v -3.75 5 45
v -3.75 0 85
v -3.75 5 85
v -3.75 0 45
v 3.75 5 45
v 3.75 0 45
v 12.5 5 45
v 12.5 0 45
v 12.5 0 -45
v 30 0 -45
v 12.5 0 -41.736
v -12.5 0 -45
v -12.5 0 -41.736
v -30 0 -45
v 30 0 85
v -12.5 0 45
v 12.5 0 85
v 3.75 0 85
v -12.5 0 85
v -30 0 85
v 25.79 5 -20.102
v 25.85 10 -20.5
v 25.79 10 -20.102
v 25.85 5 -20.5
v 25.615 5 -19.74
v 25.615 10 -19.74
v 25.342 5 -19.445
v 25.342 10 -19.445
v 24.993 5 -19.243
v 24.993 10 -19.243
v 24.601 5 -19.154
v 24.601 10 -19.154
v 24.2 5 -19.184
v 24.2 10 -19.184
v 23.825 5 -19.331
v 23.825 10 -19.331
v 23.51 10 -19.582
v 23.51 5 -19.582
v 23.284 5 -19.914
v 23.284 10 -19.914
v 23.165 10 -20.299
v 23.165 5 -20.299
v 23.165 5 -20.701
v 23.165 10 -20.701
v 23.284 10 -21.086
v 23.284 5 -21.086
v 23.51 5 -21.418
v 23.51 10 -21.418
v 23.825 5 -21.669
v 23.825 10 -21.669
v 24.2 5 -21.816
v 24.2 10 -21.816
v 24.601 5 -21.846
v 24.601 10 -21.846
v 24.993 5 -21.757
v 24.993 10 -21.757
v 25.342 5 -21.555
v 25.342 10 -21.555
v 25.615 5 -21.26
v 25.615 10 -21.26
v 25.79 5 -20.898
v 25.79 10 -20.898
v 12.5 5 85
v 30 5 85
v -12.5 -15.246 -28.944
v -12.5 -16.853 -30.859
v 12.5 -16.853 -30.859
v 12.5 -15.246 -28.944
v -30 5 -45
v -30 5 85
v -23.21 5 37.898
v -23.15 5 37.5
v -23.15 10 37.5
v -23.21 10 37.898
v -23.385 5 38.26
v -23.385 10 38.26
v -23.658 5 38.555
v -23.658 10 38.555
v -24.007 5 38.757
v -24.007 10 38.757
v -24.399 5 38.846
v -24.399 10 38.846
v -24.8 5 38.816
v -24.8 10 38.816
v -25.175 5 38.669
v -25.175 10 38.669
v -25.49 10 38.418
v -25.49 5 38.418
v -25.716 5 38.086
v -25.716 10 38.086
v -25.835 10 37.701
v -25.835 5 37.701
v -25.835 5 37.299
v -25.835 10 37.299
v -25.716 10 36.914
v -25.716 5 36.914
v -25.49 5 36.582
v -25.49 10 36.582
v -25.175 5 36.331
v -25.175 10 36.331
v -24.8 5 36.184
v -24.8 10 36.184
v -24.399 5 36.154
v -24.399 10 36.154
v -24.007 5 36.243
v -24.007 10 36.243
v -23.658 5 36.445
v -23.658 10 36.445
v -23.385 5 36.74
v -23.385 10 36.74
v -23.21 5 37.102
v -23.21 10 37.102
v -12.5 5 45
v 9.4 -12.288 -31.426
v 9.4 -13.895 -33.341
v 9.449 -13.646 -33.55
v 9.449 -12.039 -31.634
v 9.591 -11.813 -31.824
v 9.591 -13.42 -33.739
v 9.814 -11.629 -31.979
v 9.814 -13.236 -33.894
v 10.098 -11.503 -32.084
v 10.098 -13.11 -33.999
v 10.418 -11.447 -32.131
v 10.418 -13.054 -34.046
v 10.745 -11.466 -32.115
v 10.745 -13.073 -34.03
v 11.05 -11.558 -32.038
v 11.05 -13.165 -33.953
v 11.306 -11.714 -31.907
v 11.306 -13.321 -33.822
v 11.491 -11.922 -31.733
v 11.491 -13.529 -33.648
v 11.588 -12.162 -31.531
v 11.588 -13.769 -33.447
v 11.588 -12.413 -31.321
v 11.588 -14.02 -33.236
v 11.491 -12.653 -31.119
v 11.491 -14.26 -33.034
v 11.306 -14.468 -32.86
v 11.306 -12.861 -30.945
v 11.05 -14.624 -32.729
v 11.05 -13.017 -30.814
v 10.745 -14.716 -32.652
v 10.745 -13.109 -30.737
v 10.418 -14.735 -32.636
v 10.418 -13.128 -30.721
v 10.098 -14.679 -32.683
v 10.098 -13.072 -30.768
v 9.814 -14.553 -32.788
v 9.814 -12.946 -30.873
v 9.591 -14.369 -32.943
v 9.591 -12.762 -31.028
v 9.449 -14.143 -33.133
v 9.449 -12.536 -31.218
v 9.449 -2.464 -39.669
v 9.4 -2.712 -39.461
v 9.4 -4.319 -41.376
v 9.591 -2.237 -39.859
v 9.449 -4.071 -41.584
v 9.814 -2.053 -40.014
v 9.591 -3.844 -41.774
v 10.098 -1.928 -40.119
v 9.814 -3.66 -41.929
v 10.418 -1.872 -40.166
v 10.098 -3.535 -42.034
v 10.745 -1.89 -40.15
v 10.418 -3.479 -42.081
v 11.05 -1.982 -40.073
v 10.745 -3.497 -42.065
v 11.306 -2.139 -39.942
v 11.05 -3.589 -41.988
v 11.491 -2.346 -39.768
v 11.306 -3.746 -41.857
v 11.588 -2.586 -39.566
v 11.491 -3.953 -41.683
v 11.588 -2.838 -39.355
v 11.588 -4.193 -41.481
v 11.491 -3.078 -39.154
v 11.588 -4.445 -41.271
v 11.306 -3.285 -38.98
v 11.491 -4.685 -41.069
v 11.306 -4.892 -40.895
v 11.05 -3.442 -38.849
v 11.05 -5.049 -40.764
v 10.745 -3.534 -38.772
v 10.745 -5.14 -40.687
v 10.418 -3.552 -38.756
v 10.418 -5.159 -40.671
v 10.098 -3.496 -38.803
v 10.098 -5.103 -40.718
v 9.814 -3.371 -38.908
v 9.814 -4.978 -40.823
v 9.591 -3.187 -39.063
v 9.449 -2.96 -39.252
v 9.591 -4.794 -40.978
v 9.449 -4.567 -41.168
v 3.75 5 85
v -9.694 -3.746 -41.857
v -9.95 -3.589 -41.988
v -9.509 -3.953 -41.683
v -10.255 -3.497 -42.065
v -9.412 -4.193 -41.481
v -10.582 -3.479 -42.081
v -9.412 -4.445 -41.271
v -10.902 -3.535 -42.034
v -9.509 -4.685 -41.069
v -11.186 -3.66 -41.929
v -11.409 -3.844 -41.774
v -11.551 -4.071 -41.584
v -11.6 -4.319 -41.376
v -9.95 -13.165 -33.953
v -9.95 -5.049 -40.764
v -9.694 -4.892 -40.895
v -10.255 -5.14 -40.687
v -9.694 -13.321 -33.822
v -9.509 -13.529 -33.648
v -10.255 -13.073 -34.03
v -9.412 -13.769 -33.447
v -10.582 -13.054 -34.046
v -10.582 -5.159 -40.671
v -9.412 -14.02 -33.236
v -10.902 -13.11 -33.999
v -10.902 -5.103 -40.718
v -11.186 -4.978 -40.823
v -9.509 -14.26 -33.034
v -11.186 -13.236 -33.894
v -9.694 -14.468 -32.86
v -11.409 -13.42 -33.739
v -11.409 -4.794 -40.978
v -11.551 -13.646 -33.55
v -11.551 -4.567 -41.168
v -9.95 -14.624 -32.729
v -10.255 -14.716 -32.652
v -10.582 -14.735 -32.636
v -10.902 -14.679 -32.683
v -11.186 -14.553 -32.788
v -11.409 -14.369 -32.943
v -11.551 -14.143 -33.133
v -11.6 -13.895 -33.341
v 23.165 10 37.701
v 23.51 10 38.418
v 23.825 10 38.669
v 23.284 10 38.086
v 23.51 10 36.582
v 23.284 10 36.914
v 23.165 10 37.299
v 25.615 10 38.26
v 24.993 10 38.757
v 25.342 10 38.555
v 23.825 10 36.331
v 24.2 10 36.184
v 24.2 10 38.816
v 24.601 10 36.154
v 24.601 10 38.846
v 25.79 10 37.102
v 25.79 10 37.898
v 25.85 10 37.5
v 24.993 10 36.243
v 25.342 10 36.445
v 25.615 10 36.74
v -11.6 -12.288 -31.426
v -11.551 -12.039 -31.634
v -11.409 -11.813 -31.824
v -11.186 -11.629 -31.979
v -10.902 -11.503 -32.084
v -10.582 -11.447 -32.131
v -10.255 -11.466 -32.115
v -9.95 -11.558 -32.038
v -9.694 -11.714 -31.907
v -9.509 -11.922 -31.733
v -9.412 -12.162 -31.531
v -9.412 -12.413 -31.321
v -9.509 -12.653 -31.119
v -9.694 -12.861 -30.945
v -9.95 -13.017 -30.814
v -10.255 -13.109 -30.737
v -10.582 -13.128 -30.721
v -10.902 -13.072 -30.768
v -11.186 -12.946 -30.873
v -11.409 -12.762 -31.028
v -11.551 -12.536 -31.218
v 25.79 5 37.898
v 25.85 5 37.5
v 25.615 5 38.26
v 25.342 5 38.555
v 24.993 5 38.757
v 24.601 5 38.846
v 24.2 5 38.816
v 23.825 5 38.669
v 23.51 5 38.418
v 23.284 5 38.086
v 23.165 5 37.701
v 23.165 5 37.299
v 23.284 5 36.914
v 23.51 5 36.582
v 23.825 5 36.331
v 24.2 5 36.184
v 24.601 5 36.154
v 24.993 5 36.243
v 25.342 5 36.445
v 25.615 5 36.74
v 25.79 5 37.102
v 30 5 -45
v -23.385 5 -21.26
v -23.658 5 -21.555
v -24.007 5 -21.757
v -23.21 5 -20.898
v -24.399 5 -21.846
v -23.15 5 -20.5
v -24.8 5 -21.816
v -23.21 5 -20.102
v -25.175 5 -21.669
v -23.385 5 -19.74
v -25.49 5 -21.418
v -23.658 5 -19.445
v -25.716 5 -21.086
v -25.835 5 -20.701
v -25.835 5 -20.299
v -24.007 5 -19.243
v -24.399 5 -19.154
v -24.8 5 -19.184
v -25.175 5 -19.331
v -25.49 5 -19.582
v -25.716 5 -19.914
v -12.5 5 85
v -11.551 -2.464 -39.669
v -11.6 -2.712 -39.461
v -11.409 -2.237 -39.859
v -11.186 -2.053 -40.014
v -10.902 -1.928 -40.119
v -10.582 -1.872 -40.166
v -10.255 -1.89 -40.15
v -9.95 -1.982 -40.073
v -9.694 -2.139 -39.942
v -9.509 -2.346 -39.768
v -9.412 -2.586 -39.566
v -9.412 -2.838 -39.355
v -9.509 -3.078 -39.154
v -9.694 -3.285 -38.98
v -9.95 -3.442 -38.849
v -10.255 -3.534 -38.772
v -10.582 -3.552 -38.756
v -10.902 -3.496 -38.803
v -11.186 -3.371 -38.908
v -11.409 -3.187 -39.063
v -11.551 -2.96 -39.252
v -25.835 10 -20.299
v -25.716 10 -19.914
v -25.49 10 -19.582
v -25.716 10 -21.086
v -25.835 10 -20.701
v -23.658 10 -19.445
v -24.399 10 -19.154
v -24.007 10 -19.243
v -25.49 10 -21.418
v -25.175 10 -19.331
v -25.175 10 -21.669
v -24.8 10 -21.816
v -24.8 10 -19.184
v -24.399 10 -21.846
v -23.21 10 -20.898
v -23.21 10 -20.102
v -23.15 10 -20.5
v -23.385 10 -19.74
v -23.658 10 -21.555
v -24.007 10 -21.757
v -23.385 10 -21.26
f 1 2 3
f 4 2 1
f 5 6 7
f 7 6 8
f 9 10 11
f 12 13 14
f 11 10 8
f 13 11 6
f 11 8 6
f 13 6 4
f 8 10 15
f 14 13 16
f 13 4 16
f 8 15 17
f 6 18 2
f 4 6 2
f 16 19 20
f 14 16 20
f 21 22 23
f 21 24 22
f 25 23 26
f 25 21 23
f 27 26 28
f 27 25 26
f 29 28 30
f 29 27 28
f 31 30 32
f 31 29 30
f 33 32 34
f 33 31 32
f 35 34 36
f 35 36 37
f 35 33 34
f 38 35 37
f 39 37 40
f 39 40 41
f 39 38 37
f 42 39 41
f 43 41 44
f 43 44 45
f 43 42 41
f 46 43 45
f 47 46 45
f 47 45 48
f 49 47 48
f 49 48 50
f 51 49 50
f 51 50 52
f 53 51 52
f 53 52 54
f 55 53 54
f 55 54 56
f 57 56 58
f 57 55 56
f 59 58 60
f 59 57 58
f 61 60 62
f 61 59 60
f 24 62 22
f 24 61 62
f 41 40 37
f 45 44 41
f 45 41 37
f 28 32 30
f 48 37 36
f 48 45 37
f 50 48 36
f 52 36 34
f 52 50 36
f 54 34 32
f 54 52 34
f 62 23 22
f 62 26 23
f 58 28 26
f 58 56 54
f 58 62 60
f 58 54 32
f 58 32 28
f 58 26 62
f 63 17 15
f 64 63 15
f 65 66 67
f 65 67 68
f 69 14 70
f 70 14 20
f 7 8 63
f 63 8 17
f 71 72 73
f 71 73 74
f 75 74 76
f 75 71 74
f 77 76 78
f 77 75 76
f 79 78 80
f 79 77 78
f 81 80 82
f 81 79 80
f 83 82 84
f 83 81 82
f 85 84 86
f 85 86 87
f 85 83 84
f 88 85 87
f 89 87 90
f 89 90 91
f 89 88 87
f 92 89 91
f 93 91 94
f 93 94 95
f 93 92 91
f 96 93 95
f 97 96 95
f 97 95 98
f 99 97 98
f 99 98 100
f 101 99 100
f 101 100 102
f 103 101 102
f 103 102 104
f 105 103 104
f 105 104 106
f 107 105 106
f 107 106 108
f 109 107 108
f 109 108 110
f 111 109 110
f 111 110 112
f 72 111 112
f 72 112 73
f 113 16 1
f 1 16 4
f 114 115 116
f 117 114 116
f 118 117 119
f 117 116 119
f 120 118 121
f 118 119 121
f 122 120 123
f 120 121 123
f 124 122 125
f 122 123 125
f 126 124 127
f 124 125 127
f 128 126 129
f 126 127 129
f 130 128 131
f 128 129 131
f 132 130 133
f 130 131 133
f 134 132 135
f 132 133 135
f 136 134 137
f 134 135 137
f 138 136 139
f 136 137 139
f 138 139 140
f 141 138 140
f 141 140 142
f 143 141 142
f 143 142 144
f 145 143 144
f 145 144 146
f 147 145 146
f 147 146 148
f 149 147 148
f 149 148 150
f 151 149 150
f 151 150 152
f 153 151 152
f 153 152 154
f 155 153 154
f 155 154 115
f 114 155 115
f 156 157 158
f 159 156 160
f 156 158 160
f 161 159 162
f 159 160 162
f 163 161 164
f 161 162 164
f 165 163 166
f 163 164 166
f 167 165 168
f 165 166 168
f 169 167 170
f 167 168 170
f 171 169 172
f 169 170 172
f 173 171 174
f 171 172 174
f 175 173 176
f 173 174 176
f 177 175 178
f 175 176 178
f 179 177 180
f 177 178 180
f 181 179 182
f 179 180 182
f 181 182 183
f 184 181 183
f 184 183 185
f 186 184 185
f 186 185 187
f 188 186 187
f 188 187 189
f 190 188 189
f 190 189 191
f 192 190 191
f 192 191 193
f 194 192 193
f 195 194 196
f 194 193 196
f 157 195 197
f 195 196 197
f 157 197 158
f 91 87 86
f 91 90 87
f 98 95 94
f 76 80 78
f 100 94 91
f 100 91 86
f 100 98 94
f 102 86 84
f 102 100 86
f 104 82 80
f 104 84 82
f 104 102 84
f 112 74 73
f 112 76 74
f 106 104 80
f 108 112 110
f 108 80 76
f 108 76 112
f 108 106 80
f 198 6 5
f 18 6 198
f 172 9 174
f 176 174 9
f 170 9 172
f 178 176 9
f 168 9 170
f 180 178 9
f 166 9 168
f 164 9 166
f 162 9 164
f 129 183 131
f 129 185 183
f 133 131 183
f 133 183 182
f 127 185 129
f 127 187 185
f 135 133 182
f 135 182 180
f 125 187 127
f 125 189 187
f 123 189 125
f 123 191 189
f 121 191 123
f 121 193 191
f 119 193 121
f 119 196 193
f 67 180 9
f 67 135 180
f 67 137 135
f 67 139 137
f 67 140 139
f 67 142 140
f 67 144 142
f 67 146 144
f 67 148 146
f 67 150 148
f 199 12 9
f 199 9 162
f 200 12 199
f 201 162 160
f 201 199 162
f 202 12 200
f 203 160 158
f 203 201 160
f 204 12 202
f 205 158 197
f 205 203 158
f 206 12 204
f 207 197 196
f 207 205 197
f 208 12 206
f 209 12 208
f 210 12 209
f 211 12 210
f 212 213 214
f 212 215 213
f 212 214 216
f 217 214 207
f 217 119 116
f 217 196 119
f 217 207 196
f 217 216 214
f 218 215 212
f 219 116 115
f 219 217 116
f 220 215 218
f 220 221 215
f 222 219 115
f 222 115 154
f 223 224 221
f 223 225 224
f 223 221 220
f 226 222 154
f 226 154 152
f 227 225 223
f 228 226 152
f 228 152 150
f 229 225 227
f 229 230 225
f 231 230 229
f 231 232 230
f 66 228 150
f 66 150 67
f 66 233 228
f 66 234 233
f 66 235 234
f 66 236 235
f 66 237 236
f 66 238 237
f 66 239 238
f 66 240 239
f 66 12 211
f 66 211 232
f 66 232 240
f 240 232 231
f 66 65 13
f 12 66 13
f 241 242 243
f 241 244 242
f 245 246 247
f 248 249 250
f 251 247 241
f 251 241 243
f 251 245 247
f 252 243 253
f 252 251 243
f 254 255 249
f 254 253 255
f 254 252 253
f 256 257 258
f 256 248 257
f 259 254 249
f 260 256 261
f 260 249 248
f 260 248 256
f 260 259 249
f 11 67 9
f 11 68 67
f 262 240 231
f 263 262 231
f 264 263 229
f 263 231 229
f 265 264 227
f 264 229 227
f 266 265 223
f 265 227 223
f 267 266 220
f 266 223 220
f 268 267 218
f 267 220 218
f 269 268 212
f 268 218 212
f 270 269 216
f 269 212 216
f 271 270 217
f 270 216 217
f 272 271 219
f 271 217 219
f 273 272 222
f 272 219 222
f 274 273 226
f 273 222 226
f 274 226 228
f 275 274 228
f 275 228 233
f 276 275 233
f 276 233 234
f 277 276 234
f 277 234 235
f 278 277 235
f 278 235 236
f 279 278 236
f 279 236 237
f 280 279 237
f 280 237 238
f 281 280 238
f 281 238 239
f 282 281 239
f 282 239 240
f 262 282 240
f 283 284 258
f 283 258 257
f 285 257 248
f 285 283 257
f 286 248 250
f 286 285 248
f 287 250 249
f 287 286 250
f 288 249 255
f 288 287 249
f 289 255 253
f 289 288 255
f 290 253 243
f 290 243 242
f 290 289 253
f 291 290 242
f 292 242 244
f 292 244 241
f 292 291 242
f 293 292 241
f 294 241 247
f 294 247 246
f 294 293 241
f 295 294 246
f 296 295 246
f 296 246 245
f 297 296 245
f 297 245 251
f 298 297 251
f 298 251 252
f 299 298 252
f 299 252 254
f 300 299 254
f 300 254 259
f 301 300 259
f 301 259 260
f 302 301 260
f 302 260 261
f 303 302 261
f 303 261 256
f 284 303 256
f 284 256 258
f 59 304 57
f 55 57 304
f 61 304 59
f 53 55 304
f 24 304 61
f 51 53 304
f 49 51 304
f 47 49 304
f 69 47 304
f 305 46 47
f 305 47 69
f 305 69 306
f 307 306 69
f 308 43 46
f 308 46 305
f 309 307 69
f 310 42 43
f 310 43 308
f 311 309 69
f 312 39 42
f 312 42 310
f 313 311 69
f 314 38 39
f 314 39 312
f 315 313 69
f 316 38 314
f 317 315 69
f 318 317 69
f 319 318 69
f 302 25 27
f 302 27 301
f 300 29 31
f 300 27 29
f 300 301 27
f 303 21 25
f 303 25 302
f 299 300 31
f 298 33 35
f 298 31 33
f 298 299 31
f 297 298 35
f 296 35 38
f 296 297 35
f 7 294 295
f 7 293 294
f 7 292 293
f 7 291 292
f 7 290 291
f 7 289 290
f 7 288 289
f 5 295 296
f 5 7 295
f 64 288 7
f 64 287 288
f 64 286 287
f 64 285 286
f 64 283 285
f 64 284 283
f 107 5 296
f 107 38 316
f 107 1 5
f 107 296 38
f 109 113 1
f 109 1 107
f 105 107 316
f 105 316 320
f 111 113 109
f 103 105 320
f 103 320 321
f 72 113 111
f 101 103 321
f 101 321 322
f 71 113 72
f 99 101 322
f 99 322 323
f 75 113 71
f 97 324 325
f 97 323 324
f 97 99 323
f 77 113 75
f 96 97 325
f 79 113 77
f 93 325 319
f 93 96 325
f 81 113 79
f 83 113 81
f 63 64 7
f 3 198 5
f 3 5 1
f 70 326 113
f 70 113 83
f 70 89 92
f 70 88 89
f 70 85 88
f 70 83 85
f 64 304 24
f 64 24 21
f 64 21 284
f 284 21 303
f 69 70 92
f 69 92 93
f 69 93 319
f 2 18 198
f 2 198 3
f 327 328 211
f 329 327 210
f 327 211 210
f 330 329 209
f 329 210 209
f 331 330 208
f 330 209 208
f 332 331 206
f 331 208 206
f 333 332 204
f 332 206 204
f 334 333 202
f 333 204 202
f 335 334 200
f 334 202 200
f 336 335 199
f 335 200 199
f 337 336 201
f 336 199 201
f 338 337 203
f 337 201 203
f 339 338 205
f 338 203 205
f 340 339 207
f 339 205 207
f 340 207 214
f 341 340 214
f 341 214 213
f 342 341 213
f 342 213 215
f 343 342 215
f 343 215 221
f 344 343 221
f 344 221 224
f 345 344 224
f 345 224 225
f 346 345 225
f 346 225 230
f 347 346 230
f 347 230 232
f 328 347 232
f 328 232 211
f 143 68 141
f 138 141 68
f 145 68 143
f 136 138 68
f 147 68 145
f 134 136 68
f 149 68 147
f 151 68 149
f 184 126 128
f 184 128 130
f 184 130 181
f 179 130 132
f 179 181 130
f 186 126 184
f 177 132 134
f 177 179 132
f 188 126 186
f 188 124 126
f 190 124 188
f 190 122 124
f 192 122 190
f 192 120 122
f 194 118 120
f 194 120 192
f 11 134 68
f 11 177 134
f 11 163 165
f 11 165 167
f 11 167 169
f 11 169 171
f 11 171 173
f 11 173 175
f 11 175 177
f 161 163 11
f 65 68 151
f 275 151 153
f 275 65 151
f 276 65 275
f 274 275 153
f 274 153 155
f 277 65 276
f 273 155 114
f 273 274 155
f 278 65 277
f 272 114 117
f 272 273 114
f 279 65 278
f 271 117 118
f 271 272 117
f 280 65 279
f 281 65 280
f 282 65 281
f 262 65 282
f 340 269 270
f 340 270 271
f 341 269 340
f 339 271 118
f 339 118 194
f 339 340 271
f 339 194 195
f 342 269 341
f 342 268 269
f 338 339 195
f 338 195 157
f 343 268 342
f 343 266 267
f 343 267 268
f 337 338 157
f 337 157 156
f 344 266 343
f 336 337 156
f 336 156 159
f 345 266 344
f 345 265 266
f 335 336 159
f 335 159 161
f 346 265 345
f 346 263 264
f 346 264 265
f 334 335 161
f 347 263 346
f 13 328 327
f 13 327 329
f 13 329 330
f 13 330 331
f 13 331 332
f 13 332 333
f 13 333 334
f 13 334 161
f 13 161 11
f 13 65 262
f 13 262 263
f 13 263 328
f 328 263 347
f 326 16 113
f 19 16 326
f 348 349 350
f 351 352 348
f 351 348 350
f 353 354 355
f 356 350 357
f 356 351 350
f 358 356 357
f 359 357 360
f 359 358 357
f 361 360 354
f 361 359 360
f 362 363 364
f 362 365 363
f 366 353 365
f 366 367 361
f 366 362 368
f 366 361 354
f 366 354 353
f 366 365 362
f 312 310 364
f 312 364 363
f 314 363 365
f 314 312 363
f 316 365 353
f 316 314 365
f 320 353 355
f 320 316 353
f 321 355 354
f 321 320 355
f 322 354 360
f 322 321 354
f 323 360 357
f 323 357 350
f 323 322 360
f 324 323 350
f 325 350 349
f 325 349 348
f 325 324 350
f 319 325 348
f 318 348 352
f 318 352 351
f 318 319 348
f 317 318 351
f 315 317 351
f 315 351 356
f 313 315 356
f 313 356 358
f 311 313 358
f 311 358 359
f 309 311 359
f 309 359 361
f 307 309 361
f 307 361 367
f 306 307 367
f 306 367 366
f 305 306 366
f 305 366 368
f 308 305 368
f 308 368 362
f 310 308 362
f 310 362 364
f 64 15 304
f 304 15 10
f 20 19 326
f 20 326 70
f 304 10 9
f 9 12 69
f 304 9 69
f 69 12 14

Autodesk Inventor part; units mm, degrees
ref_plane "YZ Plane" through (0, 0, 0) normal (1, 0, 0) x (0, 1, 0)
ref_plane "XZ Plane" through (0, 0, 0) normal (0, 1, 0) x (-1, 0, 0)
ref_plane "XY Plane" through (0, 0, 0) normal (0, 0, 1) x (1, 0, 0)
sketch "Sketch1" plane through (0, 0, 0) normal (0, 1, 0) x (-1, 0, 0)
  line L0 (30, 45) -> (-30, 45)
  line L1 (-30, 45) -> (-30, -45)
  line L2 (-30, -45) -> (30, -45)
  line L3 (30, -45) -> (30, 45)
  line L4 (30, 45) -> (12.5, 45)
  line L5 (12.5, 45) -> (12.5, 85)
  line L6 (12.5, 85) -> (30, 85)
  line L7 (30, 85) -> (30, 45)
  line L8 (-30, 45) -> (-12.5, 45)
  line L9 (-12.5, 45) -> (-12.5, 85)
  line L10 (-12.5, 85) -> (-30, 85)
  line L11 (-30, 85) -> (-30, 45)
  line L12 (3.75, 45) -> (-3.75, 45)
  line L13 (-3.75, 45) -> (-3.75, 85)
  line L14 (-3.75, 85) -> (3.75, 85)
  line L15 (3.75, 85) -> (3.75, 45)
  point P0 (0, 0)
  point P1 (0, 45)
  dimension "d0" = 90
  dimension "d1" = 60
  dimension "d2" = 45
  dimension "d3" = 30
  dimension "d23" = 40
  dimension "d24" = 25
  dimension "d25" = 17.5
  dimension "d39" = 7.5
  dimension "d40" = 40
  dimension "d41" = 3.75
extrude "Extrusion1" add sketch "Sketch1" along normal blind 5
sketch "Sketch2" plane through (0, 5, 0) normal (0, 1, 0) x (1, 0, 0)
  line L0 (-24.5, -37.5) -> (24.5, -37.5)
  line L1 (24.5, -37.5) -> (24.5, 20.5)
  line L2 (24.5, 20.5) -> (-24.5, 20.5)
  line L3 (-24.5, 20.5) -> (-24.5, -37.5)
  line L4 (-12.5, -45) -> (12.5, -45) projected
  circle A0 centre (-24.5, -37.5) radius 1.35
  line L5 (-24.5, -8.5) -> (24.5, -8.5)
  line L6 (0, -37.5) -> (0, 20.5)
  circle A1 centre (24.5, -37.5) radius 1.35
  circle A2 centre (-24.5, 20.5) radius 1.35
  circle A3 centre (24.5, 20.5) radius 1.35
  point P0 (0, 0)
  point P1 (-30, -45)
  point P2 (30, -45)
  dimension "d6" = 49
  dimension "d7" = 58
  dimension "d8" = 24.5
  dimension "d9" = 7.5
  dimension "d10" = 2.7
  dimension "d13" = 49
  dimension "d16" = 58
extrude "Extrusion2" add sketch "Sketch2" along normal blind 5 contours L3 A0 L0 | L0 A0 L3 | A1 L1 L0 | L0 L1 A1 | A2 L2 L3 | L3 L2 A2 | A3 L2 L1 | L1 L2 A3
sketch "Sketch4" plane through (0, 0, 0) normal (1, 0, 0) x (0, 1, 0)
  line L0 (0, -45) -> (5, -45) projected
  line L1 (0, -45) -> (-16.853, -30.8587)
  line L2 (-16.853, -30.8587) -> (-15.246, -28.9436)
  line L3 (-15.246, -28.9436) -> (0, -41.7365)
  line L4 (0, -45) -> (0, 85) projected
  point P0 (0, 0)
  dimension "d28" = 130
  dimension "d29" = 2.5
  dimension "d30" = 22
extrude "Extrusion4" add sketch "Sketch4" along normal mid plane 25
sketch "Sketch6" plane through (12.5, 0, -45) normal (0, -0.6428, -0.766) x (-1, 0, 0)
  line L0 (-17.5, 0) -> (0, 0) projected
  line L1 (25, -22) -> (0, -22) projected
  line L2 (0, 0) -> (25, 0)
  line L3 (25, 0) -> (25, -22)
  line L4 (25, -22) -> (0, -22)
  line L5 (0, -22) -> (0, 0)
  line L6 (25, -2.0977) -> (0, -2.0977) projected
  circle A0 centre (2, -5.638) radius 1.1
  circle A1 centre (23, -5.638) radius 1.1
  circle A2 centre (2, -18.138) radius 1.1
  circle A3 centre (23, -18.138) radius 1.1
  line L7 (8.25, -13.788) -> (16.75, -13.788)
  line L8 (16.75, -13.788) -> (16.75, -22.288)
  line L9 (16.75, -22.288) -> (8.25, -22.288)
  line L10 (8.25, -22.288) -> (8.25, -13.788)
  line L11 (0, -22) -> (0, 0) projected
  line L12 (25, -22) -> (25, -2.0977) projected
  line L13 (0, -3.638) -> (25, -3.638)
  line L14 (25, -3.638) -> (25, -27.5)
  line L15 (25, -27.5) -> (0, -27.5)
  line L16 (0, -27.5) -> (0, -3.638)
  line L17 (12.5, -13.788) -> (12.5, -22.288)
  line L18 (8.25, -18.038) -> (16.75, -18.038)
  dimension "d42" = 2.2
  dimension "d43" = 2.2
  dimension "d44" = 2.2
  dimension "d45" = 2.2
  dimension "d47" = 2
  dimension "d48" = 0
  dimension "d50" = 0
  dimension "d52" = 0
  dimension "d53" = 2
  dimension "d56" = 0
  dimension "d59" = 12.5
  dimension "d60" = 8.5
  dimension "d61" = 8.5
  dimension "d63" = 23.862
  dimension "d65" = 2
  dimension "d66" = 12.5
  dimension "d69" = 9.462
  dimension "d70" = 5.5
extrude "Extrusion5" cut sketch "Sketch6" against normal blind 5 contours A0 | A1 | A2 | A3
sketch "Sketch9" plane through (12.5, 0, -45) normal (0, -0.6428, -0.766) x (-1, 0, 0)
  circle A0 centre (12.5, -18.038) radius 0.2236
  point P0 (12.5, -28.9254)
properties part number "Platform"
